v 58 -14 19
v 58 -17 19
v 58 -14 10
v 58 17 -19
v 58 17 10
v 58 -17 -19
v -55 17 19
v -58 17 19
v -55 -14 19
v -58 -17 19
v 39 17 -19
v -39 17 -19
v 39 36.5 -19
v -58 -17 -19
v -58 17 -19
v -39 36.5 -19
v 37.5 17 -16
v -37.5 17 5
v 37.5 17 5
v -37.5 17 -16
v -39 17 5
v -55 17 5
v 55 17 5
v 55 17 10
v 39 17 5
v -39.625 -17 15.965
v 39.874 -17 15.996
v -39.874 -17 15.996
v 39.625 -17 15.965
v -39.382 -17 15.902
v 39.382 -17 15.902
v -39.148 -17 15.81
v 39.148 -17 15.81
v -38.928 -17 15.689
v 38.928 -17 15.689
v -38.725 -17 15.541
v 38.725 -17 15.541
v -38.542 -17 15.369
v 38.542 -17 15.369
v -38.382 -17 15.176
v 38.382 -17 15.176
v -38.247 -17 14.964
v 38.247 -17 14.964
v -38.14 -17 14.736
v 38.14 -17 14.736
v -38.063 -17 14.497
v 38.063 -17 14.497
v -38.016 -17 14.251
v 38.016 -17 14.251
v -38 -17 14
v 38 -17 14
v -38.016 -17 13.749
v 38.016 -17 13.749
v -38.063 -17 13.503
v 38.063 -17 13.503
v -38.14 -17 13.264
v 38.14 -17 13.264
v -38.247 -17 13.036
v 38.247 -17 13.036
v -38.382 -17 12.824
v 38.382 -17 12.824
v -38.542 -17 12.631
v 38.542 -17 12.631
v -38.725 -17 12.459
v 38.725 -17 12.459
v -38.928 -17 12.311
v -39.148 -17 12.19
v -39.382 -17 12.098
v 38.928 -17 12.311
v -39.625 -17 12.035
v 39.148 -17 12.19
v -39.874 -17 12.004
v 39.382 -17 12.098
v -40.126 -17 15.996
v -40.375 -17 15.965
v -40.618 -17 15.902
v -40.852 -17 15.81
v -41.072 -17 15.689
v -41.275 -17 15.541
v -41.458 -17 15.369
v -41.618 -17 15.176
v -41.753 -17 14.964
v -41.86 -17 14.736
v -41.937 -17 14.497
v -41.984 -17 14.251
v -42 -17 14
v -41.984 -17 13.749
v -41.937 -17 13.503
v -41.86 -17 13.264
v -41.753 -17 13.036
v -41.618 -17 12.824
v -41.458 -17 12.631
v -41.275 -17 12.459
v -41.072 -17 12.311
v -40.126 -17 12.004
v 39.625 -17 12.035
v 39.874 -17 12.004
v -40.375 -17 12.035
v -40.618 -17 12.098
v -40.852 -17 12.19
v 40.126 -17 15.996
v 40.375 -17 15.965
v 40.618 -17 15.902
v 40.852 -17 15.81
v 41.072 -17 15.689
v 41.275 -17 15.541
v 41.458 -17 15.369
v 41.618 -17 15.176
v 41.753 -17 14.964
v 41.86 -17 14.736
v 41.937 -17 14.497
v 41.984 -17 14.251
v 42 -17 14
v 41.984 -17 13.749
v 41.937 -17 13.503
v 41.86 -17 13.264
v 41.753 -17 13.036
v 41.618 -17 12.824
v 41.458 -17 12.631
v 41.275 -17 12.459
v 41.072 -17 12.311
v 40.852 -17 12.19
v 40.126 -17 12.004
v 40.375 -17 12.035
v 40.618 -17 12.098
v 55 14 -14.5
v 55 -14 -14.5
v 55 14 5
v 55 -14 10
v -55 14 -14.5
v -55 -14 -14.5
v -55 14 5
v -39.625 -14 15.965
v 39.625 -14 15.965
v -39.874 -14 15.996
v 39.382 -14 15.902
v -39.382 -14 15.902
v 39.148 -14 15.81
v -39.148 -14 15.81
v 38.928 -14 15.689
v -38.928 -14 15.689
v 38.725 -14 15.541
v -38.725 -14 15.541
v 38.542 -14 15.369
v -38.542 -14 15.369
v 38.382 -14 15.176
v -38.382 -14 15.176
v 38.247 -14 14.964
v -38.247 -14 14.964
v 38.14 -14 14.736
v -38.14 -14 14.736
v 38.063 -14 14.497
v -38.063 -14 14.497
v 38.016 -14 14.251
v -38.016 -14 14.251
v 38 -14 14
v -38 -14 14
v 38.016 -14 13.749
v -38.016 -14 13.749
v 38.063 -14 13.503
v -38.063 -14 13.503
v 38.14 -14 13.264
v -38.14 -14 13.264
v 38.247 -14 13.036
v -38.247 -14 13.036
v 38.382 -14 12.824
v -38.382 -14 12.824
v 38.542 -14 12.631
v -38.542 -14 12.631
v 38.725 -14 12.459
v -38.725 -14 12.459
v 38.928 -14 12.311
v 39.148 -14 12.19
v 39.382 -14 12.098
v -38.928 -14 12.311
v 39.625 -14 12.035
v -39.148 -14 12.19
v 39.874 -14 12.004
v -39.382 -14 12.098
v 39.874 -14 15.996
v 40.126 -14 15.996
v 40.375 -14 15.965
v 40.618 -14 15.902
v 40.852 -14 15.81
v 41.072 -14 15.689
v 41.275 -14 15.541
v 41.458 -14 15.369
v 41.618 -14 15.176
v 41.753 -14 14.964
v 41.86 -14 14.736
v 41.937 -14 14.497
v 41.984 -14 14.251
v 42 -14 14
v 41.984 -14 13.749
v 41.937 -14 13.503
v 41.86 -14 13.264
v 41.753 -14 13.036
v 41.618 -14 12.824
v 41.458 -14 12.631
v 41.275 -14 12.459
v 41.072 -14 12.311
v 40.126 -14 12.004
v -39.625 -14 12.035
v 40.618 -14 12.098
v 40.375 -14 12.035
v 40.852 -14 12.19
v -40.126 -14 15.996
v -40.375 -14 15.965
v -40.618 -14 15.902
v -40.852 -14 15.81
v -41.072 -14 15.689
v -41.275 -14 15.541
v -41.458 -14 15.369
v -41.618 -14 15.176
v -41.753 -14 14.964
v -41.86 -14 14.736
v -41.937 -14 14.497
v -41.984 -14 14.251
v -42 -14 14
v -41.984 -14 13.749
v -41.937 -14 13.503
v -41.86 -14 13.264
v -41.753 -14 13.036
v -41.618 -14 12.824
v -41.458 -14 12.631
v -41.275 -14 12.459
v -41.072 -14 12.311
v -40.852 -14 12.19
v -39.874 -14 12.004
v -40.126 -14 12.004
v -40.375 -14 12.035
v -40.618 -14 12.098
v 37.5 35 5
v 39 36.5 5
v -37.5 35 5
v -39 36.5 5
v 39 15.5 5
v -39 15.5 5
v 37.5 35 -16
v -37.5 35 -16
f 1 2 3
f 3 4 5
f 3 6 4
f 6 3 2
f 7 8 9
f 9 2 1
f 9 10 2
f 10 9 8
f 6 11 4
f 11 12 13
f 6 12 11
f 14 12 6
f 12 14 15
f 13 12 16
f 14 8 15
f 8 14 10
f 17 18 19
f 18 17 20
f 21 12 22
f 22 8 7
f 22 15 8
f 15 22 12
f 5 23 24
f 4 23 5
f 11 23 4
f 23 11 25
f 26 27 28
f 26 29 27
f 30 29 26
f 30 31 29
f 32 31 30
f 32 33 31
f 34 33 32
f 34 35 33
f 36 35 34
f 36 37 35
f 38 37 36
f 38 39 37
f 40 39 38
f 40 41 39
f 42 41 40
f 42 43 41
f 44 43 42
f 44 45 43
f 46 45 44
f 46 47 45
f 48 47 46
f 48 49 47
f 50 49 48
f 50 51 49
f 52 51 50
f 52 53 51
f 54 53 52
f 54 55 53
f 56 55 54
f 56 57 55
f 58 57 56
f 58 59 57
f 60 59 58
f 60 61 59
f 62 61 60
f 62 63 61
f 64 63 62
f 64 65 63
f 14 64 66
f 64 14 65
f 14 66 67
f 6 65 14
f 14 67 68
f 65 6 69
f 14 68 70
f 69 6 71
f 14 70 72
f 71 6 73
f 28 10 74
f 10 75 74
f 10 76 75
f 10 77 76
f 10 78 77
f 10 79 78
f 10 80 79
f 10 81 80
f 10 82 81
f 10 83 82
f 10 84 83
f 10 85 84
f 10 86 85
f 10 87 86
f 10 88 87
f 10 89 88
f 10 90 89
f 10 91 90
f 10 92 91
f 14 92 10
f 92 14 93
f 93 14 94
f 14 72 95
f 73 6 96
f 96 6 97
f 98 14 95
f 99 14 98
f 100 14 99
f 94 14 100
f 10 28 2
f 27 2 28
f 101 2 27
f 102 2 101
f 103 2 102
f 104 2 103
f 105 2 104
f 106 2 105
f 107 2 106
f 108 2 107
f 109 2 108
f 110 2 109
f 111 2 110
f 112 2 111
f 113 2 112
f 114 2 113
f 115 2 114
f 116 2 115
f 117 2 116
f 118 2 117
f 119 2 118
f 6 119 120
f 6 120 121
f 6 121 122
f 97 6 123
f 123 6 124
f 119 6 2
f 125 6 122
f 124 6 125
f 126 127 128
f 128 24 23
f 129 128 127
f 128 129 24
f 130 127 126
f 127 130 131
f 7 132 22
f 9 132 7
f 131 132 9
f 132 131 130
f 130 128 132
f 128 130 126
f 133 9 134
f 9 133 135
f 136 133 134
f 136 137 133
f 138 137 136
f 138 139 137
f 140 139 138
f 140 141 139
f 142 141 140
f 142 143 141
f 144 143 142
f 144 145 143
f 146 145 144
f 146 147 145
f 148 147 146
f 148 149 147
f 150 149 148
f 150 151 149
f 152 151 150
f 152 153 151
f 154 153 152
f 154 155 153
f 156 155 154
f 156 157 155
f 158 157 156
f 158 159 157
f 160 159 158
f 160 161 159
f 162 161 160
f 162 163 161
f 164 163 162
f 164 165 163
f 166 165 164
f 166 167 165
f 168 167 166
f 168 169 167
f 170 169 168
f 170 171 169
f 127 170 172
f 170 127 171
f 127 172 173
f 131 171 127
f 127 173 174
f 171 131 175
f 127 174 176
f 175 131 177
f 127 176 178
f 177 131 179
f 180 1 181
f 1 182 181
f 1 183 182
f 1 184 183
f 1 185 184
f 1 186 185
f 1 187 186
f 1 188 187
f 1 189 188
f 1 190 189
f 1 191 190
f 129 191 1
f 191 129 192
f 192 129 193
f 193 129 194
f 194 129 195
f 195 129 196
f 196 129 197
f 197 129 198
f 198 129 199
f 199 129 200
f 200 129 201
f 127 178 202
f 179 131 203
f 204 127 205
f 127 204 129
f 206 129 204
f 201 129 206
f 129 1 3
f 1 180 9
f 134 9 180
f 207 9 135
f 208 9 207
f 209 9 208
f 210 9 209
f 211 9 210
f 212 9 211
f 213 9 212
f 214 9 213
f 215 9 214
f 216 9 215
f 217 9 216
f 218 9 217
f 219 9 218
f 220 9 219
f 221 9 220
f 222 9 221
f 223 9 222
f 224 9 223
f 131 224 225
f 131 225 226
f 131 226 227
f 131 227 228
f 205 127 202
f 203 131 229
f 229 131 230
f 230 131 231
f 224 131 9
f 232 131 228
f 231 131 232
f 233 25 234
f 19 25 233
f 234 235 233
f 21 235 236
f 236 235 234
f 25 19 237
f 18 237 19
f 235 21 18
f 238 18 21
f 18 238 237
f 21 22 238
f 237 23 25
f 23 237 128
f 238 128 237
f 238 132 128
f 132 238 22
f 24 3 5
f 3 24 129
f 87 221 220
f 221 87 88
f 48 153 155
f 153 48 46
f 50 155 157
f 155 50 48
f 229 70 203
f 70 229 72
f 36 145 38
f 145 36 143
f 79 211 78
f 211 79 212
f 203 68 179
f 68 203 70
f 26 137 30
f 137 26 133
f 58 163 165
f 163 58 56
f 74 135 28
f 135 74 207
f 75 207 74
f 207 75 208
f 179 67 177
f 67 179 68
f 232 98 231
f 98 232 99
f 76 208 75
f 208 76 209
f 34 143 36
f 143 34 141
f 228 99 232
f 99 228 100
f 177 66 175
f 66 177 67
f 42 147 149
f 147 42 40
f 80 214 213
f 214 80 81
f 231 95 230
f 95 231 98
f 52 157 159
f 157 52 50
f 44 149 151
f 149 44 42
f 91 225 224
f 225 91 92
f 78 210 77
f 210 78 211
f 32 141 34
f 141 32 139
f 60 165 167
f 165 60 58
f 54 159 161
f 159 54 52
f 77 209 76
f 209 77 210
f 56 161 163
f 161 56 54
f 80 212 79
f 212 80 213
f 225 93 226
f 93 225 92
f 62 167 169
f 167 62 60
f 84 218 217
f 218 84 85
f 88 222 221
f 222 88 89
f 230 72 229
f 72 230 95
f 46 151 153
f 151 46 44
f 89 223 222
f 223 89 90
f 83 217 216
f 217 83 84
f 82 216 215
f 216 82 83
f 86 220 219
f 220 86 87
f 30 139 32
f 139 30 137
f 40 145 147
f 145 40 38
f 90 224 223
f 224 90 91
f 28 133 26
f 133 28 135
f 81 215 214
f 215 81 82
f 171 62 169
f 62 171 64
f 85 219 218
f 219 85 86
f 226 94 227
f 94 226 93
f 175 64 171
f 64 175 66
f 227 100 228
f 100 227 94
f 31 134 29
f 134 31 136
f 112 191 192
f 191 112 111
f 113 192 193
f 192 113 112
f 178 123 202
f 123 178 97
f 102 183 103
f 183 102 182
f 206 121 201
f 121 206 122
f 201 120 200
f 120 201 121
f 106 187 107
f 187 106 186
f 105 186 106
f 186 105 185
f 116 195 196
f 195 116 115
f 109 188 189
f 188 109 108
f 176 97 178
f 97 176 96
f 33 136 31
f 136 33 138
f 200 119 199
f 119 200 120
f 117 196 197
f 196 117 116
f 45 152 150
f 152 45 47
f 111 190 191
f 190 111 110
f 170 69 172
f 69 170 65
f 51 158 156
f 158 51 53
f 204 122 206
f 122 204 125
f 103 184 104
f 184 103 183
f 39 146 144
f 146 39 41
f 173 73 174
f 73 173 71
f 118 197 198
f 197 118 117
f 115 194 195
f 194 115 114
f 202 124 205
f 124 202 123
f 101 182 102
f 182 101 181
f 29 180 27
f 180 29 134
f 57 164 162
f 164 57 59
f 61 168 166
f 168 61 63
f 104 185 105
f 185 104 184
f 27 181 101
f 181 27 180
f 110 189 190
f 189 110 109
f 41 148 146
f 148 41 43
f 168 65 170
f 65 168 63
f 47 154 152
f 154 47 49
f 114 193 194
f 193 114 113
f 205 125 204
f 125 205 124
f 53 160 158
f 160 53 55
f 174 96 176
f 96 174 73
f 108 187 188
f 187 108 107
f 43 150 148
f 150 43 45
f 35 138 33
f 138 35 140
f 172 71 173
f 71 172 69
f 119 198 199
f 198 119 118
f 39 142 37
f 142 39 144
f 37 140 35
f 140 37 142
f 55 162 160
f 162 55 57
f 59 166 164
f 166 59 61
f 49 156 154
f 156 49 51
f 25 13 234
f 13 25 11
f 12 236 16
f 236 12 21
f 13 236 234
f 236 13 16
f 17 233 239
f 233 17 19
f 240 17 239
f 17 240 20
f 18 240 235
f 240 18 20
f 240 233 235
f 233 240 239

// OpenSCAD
$fn=50;
difference() {
	cube([116,34,38],center=true);
	translate([0,0,3]) cube([110,28,35],center=true);
	translate([0,16,15]) cube([110,6,20],center=true);
	translate([58,02,20]) cube([110,32,20],center=true);
	rotate([90,0,0]) translate([-40,14,0]) cylinder (r=2,20);
	rotate([90,0,0]) translate([40,14,0]) cylinder (r=2,20);
}

difference() {
	translate([0,26,-7]) cube([78,21,24],center=true);
	translate([0,26,-4]) cube([75,18,24],center=true);	
}

//translate([0,26,3]) color("red") cube([74,16.5,38], center=true);
